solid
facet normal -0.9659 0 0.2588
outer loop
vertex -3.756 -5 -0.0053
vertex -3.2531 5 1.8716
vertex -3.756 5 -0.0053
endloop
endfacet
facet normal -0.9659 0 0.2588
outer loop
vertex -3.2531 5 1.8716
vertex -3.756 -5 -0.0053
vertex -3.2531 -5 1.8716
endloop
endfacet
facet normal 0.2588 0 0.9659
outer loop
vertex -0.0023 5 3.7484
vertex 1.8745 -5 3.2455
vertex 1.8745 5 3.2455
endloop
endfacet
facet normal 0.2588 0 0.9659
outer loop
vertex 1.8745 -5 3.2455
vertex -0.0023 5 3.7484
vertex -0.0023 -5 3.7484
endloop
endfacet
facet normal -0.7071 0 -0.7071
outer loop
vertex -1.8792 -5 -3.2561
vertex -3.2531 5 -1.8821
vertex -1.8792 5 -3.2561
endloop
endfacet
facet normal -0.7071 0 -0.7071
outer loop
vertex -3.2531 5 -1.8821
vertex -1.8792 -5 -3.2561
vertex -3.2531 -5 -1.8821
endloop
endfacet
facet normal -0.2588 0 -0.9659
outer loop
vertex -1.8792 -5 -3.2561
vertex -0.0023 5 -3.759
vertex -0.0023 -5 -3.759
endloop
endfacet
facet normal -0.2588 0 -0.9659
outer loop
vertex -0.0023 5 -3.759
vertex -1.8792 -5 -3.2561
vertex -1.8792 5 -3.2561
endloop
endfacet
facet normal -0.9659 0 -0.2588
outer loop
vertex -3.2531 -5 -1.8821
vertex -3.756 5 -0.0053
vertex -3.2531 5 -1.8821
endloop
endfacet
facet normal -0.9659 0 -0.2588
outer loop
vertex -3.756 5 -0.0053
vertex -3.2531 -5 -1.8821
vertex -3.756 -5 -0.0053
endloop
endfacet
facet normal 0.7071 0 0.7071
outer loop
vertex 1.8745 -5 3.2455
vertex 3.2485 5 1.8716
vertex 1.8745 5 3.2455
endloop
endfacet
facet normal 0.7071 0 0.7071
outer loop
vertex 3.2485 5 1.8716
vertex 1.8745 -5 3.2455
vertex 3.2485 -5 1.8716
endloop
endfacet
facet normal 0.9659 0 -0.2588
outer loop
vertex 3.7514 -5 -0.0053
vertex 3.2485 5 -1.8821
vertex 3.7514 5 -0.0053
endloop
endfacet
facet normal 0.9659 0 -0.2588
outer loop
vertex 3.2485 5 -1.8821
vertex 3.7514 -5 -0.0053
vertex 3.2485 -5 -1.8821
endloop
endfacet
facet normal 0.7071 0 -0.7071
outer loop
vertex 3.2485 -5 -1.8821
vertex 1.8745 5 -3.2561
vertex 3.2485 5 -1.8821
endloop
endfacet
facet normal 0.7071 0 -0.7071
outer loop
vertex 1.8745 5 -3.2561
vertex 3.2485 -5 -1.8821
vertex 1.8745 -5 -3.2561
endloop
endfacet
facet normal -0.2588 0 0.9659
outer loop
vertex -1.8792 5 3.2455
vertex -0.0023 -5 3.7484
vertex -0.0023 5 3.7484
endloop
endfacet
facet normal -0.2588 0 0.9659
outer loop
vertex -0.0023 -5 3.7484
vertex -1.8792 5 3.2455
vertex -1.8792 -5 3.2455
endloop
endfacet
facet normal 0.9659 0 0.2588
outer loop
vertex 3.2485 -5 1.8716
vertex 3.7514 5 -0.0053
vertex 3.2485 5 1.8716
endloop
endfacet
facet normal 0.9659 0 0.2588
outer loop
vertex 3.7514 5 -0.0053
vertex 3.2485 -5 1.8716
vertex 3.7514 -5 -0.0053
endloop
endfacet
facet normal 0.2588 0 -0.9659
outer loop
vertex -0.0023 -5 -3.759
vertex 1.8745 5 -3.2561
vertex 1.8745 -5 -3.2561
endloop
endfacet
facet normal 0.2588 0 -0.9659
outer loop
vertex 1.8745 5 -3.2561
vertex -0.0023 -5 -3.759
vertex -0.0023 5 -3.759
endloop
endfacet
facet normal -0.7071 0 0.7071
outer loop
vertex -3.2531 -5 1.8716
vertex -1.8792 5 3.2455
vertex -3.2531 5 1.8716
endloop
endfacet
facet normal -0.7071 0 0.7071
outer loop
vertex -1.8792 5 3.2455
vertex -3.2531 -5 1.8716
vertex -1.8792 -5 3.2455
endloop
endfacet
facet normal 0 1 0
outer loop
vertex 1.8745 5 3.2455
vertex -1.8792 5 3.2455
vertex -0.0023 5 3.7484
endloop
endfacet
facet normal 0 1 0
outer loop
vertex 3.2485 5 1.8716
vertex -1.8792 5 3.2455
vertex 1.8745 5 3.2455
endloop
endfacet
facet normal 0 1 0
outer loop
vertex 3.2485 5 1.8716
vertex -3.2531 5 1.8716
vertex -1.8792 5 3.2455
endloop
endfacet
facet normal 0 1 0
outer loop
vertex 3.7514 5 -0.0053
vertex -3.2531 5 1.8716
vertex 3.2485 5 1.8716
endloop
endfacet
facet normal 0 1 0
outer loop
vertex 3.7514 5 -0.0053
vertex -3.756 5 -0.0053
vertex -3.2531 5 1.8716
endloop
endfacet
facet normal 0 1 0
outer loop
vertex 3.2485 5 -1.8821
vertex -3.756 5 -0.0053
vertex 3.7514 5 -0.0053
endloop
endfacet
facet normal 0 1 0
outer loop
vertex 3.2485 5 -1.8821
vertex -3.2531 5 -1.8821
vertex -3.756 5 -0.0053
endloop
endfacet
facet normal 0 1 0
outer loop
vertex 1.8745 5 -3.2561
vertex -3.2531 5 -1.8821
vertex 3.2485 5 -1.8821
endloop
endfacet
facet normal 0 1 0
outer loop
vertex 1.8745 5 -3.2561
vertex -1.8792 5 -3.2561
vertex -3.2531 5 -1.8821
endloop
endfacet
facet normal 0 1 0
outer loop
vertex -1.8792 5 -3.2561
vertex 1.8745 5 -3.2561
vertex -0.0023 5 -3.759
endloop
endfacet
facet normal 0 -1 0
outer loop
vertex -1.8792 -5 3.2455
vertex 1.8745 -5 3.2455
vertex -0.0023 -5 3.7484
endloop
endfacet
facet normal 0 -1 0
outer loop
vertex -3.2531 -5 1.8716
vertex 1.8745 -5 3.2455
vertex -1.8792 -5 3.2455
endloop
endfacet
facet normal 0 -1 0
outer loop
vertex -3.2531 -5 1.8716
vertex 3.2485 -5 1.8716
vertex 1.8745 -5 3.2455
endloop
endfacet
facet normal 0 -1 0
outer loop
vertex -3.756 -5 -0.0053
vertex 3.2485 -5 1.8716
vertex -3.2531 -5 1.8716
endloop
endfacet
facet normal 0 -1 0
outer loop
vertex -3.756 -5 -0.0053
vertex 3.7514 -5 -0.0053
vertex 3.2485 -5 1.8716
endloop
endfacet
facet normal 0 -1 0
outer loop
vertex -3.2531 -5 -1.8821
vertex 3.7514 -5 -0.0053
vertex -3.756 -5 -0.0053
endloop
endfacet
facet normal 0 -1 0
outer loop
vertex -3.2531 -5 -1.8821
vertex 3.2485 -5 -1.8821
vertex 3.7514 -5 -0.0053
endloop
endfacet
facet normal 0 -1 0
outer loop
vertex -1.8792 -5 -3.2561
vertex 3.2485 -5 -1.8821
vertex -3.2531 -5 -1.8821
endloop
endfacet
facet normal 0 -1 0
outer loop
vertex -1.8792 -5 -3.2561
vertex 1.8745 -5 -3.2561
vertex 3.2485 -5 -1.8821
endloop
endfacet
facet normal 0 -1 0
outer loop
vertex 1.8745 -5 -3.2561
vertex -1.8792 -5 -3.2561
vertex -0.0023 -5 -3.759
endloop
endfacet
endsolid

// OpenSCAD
intersection() {
translate([-4.500000, -6.000011, -4.500000])
cube(size = [9.000000, 12.000012, 9.000000], center = false);
union() {
// Begin.
union() {
rotate([0, -0, 90])
translate([-5.00679e-06, 0.00231, -0.00529])
rotate([0, 90, 0])
cylinder(h = 10, r1 = 3.7537, r2 = 3.7537, center = true, $fn = 12);

rotate([0, -0, 90])
translate([-5.00679e-06, 0.00231, -0.00529])
rotate([0, 90, 0])
cylinder(h = 10, r1 = 3.7537, r2 = 3.7537, center = true, $fn = 12);
}
// End.
}
}
